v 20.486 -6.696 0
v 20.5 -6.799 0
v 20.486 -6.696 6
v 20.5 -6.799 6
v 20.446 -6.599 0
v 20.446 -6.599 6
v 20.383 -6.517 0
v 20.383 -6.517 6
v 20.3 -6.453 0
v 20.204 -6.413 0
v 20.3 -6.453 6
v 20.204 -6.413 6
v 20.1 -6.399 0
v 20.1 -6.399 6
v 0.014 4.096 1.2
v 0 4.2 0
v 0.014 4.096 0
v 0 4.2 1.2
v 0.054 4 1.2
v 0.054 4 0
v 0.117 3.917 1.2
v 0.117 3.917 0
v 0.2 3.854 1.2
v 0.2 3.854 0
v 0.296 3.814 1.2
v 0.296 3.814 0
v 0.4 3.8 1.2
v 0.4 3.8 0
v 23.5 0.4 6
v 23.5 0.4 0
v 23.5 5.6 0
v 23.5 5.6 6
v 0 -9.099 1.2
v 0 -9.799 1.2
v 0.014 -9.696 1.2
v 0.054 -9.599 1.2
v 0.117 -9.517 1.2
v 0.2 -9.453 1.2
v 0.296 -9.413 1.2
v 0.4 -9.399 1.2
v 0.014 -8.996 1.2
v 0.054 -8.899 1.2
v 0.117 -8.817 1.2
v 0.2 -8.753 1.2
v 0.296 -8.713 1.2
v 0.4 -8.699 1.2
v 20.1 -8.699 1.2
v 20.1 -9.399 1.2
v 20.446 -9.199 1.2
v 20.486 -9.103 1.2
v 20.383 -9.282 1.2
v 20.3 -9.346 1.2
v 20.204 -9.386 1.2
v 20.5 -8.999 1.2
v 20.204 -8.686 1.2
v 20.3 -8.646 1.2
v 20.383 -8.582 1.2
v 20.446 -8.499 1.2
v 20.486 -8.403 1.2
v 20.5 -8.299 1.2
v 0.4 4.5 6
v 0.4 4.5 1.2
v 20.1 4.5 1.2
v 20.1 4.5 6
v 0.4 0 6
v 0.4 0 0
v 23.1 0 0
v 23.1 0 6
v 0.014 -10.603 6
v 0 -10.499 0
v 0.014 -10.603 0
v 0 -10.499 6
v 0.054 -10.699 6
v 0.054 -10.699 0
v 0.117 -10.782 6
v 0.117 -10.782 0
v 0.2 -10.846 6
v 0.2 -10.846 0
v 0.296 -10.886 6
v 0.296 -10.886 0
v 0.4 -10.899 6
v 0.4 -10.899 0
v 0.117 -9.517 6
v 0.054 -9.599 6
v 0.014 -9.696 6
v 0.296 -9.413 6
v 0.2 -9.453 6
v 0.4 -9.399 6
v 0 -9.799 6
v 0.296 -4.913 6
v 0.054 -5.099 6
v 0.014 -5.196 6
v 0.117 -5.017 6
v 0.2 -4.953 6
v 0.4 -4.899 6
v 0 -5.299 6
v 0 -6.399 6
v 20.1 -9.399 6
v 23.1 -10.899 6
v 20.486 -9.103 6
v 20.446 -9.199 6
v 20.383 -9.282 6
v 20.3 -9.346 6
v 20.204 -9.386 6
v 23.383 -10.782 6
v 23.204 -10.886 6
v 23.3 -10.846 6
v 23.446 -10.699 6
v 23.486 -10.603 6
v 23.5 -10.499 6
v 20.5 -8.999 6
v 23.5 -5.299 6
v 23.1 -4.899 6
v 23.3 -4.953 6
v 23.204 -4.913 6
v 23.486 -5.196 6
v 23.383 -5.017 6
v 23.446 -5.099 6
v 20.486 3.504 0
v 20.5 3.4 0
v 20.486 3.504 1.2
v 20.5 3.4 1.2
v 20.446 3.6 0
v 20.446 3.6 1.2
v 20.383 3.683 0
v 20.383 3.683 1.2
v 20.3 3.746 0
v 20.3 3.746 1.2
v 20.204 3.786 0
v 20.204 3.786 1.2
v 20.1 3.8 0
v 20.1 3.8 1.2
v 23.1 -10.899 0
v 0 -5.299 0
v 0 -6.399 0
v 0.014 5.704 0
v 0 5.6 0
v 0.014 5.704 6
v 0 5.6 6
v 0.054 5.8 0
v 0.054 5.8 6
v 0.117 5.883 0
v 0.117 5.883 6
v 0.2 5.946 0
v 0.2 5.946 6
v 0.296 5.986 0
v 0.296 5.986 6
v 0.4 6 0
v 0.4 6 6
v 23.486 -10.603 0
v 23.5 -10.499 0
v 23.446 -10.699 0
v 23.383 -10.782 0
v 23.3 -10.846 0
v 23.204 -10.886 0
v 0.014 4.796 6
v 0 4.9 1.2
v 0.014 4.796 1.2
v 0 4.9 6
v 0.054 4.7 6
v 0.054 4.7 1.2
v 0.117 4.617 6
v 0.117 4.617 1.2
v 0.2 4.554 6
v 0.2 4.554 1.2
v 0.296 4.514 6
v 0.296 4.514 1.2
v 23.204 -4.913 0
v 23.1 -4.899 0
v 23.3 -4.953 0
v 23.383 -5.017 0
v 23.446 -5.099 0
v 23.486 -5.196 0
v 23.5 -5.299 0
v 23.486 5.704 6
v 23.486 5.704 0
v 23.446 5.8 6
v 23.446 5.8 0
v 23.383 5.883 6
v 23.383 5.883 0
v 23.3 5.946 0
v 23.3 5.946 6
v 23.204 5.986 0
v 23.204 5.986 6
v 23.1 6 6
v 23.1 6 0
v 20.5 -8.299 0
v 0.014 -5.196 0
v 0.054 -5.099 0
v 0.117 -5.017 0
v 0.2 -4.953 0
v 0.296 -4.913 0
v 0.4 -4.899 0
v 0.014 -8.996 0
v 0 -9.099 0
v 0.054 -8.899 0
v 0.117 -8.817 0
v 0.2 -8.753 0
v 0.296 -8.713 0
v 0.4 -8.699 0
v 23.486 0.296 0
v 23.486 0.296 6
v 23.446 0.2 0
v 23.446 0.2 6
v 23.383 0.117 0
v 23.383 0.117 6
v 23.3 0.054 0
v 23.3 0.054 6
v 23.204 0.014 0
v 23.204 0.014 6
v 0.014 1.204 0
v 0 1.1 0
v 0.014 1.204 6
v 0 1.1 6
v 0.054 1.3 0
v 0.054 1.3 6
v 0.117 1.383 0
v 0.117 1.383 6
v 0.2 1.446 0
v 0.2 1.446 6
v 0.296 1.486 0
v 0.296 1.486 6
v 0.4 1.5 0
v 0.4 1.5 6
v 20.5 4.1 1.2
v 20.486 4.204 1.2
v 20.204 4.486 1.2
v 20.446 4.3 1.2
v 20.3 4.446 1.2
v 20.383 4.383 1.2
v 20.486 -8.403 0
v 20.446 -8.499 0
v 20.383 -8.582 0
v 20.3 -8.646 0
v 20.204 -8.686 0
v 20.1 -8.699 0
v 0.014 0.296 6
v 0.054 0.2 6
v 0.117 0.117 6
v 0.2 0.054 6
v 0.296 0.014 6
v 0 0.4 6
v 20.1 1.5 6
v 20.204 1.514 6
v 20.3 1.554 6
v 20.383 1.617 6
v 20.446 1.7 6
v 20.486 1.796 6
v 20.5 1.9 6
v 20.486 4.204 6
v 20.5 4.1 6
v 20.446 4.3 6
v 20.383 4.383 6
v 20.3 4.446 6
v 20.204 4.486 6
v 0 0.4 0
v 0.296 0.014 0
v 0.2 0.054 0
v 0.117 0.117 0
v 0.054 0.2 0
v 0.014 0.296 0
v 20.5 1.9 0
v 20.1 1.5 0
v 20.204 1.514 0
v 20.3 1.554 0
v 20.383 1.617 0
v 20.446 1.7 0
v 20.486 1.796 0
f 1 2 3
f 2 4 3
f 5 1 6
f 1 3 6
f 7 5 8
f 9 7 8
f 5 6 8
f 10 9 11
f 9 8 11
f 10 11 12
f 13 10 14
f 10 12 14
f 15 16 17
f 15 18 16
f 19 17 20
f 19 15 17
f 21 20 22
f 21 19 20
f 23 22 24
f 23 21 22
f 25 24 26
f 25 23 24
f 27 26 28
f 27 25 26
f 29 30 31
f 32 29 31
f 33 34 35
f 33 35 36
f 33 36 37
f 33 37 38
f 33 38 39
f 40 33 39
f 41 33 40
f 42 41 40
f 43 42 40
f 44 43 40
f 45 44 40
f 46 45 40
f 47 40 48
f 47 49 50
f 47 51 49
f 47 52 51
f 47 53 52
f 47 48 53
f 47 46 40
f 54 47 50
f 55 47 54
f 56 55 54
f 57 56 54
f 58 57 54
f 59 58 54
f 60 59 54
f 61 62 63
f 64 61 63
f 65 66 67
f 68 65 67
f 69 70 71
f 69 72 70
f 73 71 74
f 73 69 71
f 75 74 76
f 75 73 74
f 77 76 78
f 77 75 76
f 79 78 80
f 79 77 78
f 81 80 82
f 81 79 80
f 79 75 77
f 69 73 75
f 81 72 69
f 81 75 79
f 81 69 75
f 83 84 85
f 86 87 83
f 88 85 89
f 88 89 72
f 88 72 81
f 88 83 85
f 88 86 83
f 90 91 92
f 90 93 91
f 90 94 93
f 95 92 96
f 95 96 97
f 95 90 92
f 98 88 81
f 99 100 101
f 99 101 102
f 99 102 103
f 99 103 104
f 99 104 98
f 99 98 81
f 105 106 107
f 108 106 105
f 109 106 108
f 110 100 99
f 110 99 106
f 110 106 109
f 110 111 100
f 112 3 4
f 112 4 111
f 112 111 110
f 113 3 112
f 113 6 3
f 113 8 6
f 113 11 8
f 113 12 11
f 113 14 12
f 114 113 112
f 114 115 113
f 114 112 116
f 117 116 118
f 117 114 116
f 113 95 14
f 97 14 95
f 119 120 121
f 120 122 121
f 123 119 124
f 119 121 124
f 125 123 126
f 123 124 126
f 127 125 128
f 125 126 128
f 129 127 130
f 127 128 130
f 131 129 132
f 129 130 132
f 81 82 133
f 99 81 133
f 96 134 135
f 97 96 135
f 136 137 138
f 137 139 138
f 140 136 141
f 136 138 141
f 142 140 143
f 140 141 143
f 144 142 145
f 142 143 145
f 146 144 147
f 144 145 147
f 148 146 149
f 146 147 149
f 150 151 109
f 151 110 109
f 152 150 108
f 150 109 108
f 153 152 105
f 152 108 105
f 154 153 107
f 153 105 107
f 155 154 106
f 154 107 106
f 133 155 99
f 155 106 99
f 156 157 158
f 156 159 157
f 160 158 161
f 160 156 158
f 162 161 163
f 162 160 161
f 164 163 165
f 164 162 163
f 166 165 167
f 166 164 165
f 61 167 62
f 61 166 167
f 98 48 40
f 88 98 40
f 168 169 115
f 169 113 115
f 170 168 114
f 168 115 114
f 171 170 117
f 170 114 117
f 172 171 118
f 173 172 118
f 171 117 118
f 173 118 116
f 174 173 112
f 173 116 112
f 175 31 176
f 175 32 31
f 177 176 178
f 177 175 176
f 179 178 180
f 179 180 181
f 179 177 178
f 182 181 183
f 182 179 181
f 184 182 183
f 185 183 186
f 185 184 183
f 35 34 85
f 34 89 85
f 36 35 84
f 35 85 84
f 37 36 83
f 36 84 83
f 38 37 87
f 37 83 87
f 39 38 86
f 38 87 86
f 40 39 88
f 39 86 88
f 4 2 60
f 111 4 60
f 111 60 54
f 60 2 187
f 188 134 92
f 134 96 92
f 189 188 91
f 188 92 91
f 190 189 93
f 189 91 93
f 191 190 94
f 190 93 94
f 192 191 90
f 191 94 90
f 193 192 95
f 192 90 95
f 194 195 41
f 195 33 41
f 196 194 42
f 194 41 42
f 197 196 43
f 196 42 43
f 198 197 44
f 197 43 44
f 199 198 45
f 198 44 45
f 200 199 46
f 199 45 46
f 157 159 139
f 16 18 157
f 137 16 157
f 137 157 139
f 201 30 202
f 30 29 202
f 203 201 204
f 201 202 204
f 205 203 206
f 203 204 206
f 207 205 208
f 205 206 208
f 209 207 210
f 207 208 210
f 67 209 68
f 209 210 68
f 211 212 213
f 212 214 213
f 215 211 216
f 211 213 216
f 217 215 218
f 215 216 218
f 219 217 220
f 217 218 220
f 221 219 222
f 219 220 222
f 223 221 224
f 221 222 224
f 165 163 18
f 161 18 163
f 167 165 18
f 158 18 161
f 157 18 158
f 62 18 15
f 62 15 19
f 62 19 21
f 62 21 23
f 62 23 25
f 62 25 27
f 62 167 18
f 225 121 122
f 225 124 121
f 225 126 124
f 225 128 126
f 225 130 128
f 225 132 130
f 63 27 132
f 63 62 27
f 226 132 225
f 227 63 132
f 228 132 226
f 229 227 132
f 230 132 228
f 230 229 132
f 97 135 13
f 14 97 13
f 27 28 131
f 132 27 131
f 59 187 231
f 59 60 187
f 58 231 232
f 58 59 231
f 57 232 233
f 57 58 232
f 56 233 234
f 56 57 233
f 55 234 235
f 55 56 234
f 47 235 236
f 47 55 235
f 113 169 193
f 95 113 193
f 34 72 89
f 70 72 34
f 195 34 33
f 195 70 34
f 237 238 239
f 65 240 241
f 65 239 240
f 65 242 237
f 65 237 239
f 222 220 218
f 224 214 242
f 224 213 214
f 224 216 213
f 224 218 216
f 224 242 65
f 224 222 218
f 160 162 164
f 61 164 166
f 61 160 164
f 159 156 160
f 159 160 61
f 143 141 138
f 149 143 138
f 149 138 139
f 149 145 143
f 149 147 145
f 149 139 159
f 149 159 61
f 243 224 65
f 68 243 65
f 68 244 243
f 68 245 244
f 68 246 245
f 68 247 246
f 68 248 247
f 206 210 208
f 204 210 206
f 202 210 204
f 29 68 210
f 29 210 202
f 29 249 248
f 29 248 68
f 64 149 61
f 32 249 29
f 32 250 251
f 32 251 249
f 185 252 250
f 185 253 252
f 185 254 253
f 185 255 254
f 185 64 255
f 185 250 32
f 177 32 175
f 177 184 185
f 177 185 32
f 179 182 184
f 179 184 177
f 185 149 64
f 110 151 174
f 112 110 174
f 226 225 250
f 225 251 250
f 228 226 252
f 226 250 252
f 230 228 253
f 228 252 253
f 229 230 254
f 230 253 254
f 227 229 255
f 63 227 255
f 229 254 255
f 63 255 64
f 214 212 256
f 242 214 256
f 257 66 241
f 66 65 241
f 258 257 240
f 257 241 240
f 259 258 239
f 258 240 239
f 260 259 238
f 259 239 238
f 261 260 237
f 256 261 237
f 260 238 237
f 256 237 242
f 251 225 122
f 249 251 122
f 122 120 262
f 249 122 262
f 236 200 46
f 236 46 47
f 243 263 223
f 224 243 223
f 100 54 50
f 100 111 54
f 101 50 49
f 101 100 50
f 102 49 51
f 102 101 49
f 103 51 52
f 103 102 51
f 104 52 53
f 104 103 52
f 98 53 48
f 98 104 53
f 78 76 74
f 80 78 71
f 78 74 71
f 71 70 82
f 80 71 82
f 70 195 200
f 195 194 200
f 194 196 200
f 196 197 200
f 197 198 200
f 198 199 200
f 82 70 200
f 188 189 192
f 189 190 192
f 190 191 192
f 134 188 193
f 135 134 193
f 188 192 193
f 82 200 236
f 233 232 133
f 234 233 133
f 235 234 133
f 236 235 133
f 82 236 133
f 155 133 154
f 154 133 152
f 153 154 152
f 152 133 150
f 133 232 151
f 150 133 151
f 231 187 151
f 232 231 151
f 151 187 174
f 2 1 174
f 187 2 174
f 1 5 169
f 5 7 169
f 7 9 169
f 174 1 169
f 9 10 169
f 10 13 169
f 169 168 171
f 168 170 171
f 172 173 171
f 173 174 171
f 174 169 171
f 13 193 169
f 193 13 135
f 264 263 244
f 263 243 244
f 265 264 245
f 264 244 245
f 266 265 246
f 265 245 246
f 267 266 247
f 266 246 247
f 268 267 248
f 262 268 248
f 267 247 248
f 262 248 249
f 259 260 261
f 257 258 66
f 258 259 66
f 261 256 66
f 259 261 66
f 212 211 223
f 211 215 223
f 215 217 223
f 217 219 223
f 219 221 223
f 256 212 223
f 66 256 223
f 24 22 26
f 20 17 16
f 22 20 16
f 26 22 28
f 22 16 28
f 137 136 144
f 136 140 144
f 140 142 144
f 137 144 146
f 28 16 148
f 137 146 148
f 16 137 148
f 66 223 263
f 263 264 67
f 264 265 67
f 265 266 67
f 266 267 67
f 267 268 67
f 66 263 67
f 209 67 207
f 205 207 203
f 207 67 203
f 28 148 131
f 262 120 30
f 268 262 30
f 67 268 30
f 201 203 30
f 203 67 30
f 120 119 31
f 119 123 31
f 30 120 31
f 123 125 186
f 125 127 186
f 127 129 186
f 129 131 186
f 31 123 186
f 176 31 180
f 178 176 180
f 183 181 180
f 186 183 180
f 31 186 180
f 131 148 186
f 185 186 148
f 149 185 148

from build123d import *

# Parameters (mm, degrees)
BOSS_EXTRUDE1_DEPTH   = 6
BOSS_EXTRUDE1_2_DEPTH = 6
SKETCH2_4_W           = 20.5
SKETCH2_4_H           = 0.7
BOSS_EXTRUDE3_DEPTH   = 1.2
FILLET2_R             = 0.4
FILLET3_R             = 0.4


with BuildPart() as part:
    # Sketch2 → Boss-Extrude1 (new body)
    with BuildSketch(Plane.XY):
        Polygon((0, 1.5), (0, 0), (23.5, 0), (23.5, 6), (0, 6), (0, 4.5), (20.5, 4.5), (20.5, 1.5), align=None)
    extrude(amount=BOSS_EXTRUDE1_DEPTH)



with BuildPart() as body_2:
    # Sketch2 → Boss-Extrude1 2 (new body)
    with BuildSketch(Plane.XY):
        Polygon((20.5, -6.399471306), (20.5, -9.399471306), (0, -9.399471306), (0, -10.899471306), (23.5, -10.899471306), (23.5, -4.899471306), (0, -4.899471306), (0, -6.399471306), align=None)
    extrude(amount=BOSS_EXTRUDE1_2_DEPTH)


with BuildPart() as part_1:
    add(part.part)

    add(body_2.part)  # Boss-Extrude3 merges body 2
    # Sketch2<4> → Boss-Extrude3 (add)
    with BuildSketch(Plane.XY):
        with Locations((10.25, 4.15)):
            Rectangle(SKETCH2_4_W, SKETCH2_4_H)
        with Locations((10.25, -9.049471306)):
            Rectangle(SKETCH2_4_W, SKETCH2_4_H)
    extrude(amount=BOSS_EXTRUDE3_DEPTH)

    # Fillet2
    fillet2_edges = [part_1.edges().sort_by_distance(p)[0] for p in [
        (0, 4.5, 3.6),
        (20.5, 1.5, 3),
        (20.5, 3.8, 0.6),
        (20.5, 4.5, 3.6),
        (23.5, 6, 3),
        (23.5, 0, 3),
        (0, 0, 3),
        (0, 1.5, 3),
        (0, 3.8, 0.6),
        (0, 6, 3),
    ]]
    fillet(fillet2_edges, radius=FILLET2_R)

    # Fillet3
    fillet3_edges = [part_1.edges().sort_by_distance(p)[0] for p in [
        (23.5, -10.899471306, 3),
        (23.5, -4.899471306, 3),
        (20.5, -6.399471306, 3),
        (20.5, -9.399471306, 3.6),
        (20.5, -8.699471306, 0.6),
        (0, -10.899471306, 3),
        (0, -9.399471306, 3.6),
        (0, -8.699471306, 0.6),
        (0, -4.899471306, 3),
    ]]
    fillet(fillet3_edges, radius=FILLET3_R)


solid = part_1.part
